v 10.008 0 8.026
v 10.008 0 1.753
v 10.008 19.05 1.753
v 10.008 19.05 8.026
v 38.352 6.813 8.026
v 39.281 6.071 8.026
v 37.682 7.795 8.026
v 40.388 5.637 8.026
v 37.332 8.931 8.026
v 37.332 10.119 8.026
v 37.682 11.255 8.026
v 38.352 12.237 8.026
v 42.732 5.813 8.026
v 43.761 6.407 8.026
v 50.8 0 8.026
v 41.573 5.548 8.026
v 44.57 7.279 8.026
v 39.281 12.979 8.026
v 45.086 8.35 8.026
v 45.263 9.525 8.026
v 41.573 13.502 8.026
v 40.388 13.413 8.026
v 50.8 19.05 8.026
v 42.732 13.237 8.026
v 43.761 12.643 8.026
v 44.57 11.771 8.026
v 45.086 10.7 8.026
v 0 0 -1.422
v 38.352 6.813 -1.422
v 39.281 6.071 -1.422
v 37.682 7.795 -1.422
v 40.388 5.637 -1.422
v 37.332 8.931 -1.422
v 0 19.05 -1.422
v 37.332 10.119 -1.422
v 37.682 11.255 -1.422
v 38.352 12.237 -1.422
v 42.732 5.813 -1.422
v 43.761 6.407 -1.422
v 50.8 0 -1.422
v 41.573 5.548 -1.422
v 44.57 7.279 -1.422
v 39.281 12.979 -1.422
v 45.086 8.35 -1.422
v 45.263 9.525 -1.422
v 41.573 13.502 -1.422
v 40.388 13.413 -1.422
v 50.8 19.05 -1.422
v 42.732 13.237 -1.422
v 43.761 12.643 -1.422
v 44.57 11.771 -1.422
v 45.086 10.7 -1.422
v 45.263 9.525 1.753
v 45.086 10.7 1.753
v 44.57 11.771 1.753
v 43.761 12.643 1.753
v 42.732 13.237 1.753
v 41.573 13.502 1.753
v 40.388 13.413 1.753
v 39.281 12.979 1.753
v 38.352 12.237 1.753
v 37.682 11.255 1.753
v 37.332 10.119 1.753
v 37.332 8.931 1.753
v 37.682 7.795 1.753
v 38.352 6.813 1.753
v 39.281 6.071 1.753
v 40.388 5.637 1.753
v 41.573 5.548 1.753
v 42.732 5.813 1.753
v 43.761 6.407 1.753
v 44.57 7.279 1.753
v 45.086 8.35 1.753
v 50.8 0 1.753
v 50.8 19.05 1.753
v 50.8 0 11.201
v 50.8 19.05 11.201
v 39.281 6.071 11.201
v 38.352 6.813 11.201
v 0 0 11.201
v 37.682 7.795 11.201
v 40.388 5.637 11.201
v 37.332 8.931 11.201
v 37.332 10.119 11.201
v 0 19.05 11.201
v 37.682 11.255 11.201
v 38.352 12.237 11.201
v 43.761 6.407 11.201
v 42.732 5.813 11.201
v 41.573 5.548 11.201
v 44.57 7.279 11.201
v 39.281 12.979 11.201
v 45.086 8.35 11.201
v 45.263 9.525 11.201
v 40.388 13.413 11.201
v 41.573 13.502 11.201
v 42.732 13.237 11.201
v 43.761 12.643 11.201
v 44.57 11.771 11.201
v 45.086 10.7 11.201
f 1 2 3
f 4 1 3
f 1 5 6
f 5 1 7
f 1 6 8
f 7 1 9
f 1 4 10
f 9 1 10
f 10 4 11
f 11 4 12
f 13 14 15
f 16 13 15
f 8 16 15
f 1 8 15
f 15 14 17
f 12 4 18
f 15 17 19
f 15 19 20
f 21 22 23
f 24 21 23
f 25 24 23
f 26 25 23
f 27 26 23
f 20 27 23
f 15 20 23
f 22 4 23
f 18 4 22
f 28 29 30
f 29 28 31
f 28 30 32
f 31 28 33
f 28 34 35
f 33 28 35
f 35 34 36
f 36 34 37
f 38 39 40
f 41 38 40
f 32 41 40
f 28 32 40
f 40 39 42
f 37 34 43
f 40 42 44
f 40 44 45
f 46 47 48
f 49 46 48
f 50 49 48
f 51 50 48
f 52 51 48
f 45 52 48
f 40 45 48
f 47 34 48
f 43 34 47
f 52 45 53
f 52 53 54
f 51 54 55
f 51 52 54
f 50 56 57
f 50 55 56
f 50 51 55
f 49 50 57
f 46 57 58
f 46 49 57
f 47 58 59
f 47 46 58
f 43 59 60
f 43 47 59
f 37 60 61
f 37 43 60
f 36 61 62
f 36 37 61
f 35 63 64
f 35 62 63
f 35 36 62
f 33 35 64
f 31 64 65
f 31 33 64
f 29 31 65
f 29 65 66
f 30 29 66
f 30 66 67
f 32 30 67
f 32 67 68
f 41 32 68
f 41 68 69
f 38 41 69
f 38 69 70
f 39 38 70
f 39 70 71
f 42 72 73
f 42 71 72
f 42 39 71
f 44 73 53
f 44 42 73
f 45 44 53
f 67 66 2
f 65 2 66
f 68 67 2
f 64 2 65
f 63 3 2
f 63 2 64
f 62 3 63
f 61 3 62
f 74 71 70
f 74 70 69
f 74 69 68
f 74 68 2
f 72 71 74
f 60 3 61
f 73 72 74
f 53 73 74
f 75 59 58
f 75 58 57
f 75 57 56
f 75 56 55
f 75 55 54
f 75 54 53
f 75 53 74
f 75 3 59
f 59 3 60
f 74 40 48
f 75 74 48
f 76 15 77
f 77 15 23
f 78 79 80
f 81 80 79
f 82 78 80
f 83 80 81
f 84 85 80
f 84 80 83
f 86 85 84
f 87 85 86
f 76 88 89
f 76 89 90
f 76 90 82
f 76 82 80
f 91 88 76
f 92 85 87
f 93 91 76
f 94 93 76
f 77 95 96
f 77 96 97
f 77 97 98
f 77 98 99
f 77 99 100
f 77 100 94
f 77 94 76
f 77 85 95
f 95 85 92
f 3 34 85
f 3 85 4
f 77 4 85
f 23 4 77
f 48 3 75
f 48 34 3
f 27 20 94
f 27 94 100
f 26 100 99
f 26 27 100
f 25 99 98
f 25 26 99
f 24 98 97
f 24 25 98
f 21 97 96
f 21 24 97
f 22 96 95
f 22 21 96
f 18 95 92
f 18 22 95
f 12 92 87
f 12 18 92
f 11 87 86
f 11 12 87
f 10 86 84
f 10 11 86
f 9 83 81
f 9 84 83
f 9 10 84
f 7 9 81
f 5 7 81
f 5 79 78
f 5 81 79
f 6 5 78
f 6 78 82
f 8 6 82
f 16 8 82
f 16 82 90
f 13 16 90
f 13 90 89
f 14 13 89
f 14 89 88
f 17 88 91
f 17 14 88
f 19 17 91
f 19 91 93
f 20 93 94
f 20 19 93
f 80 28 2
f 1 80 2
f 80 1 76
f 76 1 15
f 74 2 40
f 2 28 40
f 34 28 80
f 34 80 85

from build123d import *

# Parameters (mm, degrees)
CYLINDER_R     = 3.9878
CYLINDER_DEPTH = 25.4
BOX001_W       = 50.8
BOX001_H       = 19.05
BOX001_DEPTH   = 3.175
BOX002_W       = 10.0076
BOX002_H       = 19.05
BOX002_DEPTH   = 6.35
BOX_W          = 50.8
BOX_H          = 19.05
BOX_DEPTH      = 3.175


with BuildPart() as cylinder:
    # Cylinder → Cylinder (new body)
    with BuildSketch(Plane(origin=(41.275, 9.525, -7.62), x_dir=(1, 0, 0), z_dir=(0, 0, 1))):
        Circle(CYLINDER_R)
    extrude(amount=CYLINDER_DEPTH)


with BuildPart() as cube001:
    # Box001 → Box001 (new body)
    with BuildSketch(Plane.XY.offset(-1.422)):
        with Locations((25.4, 9.525)):
            Rectangle(BOX001_W, BOX001_H)
    extrude(amount=BOX001_DEPTH)


with BuildPart() as cube002:
    # Box002 → Box002 (new body)
    with BuildSketch(Plane.XY.offset(1.676)):
        with Locations((5.0038, 9.525)):
            Rectangle(BOX002_W, BOX002_H)
    extrude(amount=BOX002_DEPTH)


with BuildPart() as cut:
    # Box → Box (new body)
    with BuildSketch(Plane.XY.offset(8.026)):
        with Locations((25.4, 9.525)):
            Rectangle(BOX_W, BOX_H)
    extrude(amount=BOX_DEPTH)

    # Fusion: union Cube001, Cube002
    add(cube001.part)
    add(cube002.part)

    # Cut: cut Cylinder
    add(cylinder.part, mode=Mode.SUBTRACT)


solid = cut.part
